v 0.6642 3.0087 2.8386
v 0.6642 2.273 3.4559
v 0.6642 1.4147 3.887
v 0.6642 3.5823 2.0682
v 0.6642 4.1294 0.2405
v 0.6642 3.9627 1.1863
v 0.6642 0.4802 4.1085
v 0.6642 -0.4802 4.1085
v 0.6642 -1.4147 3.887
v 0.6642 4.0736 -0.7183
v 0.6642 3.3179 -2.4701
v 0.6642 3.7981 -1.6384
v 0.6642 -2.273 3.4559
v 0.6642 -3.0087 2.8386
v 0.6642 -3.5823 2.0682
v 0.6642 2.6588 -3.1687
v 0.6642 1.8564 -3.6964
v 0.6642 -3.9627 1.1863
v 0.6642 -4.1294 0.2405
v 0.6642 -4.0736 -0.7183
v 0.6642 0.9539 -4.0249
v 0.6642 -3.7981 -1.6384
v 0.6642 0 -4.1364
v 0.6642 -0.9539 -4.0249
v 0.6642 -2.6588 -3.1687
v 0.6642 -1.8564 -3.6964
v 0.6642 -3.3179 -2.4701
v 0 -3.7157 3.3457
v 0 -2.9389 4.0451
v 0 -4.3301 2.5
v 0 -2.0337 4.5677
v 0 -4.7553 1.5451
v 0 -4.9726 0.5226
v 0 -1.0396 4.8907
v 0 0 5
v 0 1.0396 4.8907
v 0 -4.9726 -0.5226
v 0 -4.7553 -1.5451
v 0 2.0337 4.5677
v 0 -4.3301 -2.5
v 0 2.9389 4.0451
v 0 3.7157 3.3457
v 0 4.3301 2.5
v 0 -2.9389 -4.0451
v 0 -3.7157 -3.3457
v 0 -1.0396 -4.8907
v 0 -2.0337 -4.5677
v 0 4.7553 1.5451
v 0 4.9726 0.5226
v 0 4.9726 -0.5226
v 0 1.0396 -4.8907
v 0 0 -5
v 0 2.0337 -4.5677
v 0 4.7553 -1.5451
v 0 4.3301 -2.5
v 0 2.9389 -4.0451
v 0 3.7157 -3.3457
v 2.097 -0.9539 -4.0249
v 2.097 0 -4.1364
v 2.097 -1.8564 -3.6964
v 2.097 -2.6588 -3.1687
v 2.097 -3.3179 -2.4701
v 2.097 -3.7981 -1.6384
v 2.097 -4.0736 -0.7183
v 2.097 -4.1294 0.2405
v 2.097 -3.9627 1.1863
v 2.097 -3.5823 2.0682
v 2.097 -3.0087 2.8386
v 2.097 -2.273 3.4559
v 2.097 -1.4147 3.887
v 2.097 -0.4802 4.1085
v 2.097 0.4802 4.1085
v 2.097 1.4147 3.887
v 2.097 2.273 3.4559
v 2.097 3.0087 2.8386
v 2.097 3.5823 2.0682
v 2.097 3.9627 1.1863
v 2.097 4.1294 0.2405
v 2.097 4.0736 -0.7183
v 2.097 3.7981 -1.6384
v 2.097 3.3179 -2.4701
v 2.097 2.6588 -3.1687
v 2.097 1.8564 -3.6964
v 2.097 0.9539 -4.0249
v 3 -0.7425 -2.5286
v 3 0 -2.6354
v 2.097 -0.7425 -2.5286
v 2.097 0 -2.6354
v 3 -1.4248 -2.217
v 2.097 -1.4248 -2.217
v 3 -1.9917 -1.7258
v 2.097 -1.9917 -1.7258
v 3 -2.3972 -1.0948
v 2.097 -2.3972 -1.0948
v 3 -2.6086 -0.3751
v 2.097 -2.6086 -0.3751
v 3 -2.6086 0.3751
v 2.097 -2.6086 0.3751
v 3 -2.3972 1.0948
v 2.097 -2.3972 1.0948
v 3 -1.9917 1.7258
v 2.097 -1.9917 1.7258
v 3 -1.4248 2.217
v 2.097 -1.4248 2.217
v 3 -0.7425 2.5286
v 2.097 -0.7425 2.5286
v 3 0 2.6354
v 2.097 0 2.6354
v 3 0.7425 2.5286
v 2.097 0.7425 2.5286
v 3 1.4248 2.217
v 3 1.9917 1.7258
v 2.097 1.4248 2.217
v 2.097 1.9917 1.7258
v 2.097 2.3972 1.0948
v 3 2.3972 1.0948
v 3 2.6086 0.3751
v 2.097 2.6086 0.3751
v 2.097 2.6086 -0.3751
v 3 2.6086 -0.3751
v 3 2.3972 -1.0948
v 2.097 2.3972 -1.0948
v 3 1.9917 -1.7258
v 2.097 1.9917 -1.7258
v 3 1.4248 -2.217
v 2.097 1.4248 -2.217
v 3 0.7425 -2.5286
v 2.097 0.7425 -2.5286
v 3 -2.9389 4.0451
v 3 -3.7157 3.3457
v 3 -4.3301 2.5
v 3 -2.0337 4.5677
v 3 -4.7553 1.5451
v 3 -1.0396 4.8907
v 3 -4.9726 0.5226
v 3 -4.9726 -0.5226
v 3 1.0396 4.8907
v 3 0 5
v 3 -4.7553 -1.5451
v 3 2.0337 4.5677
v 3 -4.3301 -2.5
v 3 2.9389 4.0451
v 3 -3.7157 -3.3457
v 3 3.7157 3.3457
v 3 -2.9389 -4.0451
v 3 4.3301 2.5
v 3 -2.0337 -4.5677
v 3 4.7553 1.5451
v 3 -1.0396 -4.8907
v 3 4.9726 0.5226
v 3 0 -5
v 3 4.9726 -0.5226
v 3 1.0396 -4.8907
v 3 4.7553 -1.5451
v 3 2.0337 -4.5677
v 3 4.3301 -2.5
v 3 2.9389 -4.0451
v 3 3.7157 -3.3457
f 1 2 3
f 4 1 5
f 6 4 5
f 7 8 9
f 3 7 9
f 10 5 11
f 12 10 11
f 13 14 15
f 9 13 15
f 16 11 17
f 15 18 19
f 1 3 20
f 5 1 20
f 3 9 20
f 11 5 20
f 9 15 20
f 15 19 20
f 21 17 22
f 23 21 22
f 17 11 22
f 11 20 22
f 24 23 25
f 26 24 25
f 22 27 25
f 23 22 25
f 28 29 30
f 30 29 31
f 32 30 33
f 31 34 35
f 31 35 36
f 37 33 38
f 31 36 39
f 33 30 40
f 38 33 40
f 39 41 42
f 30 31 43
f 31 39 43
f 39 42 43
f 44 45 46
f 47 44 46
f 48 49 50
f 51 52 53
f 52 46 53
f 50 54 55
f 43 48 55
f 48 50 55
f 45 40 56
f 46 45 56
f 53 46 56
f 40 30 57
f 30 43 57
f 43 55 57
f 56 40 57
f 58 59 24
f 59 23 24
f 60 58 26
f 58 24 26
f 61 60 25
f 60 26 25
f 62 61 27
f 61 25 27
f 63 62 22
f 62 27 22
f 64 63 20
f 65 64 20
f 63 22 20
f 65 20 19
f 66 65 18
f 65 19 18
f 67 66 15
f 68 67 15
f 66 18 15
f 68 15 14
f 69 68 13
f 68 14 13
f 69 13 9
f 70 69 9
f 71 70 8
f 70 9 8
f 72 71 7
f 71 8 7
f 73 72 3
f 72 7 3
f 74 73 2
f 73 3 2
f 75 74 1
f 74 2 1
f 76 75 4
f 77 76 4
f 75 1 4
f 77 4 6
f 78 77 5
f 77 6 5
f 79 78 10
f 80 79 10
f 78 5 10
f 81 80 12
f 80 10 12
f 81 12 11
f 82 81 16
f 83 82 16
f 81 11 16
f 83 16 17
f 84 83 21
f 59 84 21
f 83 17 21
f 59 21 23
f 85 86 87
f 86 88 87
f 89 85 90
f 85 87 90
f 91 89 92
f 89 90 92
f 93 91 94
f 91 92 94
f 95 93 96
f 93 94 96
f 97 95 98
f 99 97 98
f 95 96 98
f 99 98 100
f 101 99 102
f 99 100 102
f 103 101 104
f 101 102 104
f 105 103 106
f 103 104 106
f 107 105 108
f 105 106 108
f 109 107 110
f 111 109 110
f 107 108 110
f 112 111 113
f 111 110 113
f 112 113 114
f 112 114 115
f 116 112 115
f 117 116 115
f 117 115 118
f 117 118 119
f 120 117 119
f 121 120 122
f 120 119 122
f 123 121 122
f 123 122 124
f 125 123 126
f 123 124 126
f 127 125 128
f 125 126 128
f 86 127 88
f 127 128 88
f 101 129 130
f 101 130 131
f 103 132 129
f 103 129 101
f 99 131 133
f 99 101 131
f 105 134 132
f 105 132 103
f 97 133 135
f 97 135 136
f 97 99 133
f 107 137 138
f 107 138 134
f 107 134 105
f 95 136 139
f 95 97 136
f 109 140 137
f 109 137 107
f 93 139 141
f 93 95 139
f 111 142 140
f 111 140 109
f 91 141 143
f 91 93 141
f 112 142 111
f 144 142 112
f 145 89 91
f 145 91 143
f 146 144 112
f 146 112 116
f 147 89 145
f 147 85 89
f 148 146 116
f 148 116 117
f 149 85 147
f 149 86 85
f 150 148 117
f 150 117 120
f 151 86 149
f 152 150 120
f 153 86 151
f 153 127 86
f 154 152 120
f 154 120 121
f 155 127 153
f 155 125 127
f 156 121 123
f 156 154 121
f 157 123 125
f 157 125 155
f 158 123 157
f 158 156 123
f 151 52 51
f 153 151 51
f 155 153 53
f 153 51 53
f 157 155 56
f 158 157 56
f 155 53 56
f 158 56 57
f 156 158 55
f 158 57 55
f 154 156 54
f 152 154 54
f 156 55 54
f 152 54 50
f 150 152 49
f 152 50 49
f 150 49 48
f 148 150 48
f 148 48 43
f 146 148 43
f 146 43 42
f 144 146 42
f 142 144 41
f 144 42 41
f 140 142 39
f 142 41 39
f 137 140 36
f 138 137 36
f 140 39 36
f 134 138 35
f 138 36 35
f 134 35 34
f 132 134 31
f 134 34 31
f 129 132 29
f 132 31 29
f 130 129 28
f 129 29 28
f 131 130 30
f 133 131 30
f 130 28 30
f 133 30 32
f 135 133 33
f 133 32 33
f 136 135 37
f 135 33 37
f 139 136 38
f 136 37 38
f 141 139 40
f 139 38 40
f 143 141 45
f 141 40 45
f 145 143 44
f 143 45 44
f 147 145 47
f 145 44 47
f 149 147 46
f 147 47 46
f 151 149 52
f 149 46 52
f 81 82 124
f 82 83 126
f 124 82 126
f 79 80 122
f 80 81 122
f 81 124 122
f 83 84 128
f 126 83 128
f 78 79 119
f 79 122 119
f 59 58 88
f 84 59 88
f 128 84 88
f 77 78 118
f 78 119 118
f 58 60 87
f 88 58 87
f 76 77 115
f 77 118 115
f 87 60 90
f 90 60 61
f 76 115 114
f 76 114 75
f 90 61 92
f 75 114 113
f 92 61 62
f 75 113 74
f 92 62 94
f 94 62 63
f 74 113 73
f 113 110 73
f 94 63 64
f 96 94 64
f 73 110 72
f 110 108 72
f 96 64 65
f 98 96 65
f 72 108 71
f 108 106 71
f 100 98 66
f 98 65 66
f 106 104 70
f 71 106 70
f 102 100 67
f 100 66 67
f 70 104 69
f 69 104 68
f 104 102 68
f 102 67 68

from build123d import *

# Parameters (mm, degrees)
SKETCH1_R           = 5
BOSS_EXTRUDE1_DEPTH = 3


with BuildPart() as part:
    # Sketch1 → Boss-Extrude1 (new body)
    with BuildSketch(Plane(origin=(0, 0, 0), x_dir=(0, 0, -1), z_dir=(1, 0, 0))):
        Circle(SKETCH1_R)
    extrude(amount=BOSS_EXTRUDE1_DEPTH)

    # Sketch2 → Cut-Revolve1 (revolve, cut)
    with BuildSketch(Plane(origin=(0, 0, 0), x_dir=(1, 0, 0), z_dir=(0, 1, 0))):
        Polygon((3, 2.635374789), (2.09701047, 2.635374789), (2.09701047, 4.136429685), (0.664185342, 4.136429685), (0.664185342, 0), (3.615122808, 0), (3.615122808, 2.635374789), align=None)
    revolve(axis=Axis((3.615122808, 0, 0), (-1, 0, 0)), mode=Mode.SUBTRACT)


solid = part.part
